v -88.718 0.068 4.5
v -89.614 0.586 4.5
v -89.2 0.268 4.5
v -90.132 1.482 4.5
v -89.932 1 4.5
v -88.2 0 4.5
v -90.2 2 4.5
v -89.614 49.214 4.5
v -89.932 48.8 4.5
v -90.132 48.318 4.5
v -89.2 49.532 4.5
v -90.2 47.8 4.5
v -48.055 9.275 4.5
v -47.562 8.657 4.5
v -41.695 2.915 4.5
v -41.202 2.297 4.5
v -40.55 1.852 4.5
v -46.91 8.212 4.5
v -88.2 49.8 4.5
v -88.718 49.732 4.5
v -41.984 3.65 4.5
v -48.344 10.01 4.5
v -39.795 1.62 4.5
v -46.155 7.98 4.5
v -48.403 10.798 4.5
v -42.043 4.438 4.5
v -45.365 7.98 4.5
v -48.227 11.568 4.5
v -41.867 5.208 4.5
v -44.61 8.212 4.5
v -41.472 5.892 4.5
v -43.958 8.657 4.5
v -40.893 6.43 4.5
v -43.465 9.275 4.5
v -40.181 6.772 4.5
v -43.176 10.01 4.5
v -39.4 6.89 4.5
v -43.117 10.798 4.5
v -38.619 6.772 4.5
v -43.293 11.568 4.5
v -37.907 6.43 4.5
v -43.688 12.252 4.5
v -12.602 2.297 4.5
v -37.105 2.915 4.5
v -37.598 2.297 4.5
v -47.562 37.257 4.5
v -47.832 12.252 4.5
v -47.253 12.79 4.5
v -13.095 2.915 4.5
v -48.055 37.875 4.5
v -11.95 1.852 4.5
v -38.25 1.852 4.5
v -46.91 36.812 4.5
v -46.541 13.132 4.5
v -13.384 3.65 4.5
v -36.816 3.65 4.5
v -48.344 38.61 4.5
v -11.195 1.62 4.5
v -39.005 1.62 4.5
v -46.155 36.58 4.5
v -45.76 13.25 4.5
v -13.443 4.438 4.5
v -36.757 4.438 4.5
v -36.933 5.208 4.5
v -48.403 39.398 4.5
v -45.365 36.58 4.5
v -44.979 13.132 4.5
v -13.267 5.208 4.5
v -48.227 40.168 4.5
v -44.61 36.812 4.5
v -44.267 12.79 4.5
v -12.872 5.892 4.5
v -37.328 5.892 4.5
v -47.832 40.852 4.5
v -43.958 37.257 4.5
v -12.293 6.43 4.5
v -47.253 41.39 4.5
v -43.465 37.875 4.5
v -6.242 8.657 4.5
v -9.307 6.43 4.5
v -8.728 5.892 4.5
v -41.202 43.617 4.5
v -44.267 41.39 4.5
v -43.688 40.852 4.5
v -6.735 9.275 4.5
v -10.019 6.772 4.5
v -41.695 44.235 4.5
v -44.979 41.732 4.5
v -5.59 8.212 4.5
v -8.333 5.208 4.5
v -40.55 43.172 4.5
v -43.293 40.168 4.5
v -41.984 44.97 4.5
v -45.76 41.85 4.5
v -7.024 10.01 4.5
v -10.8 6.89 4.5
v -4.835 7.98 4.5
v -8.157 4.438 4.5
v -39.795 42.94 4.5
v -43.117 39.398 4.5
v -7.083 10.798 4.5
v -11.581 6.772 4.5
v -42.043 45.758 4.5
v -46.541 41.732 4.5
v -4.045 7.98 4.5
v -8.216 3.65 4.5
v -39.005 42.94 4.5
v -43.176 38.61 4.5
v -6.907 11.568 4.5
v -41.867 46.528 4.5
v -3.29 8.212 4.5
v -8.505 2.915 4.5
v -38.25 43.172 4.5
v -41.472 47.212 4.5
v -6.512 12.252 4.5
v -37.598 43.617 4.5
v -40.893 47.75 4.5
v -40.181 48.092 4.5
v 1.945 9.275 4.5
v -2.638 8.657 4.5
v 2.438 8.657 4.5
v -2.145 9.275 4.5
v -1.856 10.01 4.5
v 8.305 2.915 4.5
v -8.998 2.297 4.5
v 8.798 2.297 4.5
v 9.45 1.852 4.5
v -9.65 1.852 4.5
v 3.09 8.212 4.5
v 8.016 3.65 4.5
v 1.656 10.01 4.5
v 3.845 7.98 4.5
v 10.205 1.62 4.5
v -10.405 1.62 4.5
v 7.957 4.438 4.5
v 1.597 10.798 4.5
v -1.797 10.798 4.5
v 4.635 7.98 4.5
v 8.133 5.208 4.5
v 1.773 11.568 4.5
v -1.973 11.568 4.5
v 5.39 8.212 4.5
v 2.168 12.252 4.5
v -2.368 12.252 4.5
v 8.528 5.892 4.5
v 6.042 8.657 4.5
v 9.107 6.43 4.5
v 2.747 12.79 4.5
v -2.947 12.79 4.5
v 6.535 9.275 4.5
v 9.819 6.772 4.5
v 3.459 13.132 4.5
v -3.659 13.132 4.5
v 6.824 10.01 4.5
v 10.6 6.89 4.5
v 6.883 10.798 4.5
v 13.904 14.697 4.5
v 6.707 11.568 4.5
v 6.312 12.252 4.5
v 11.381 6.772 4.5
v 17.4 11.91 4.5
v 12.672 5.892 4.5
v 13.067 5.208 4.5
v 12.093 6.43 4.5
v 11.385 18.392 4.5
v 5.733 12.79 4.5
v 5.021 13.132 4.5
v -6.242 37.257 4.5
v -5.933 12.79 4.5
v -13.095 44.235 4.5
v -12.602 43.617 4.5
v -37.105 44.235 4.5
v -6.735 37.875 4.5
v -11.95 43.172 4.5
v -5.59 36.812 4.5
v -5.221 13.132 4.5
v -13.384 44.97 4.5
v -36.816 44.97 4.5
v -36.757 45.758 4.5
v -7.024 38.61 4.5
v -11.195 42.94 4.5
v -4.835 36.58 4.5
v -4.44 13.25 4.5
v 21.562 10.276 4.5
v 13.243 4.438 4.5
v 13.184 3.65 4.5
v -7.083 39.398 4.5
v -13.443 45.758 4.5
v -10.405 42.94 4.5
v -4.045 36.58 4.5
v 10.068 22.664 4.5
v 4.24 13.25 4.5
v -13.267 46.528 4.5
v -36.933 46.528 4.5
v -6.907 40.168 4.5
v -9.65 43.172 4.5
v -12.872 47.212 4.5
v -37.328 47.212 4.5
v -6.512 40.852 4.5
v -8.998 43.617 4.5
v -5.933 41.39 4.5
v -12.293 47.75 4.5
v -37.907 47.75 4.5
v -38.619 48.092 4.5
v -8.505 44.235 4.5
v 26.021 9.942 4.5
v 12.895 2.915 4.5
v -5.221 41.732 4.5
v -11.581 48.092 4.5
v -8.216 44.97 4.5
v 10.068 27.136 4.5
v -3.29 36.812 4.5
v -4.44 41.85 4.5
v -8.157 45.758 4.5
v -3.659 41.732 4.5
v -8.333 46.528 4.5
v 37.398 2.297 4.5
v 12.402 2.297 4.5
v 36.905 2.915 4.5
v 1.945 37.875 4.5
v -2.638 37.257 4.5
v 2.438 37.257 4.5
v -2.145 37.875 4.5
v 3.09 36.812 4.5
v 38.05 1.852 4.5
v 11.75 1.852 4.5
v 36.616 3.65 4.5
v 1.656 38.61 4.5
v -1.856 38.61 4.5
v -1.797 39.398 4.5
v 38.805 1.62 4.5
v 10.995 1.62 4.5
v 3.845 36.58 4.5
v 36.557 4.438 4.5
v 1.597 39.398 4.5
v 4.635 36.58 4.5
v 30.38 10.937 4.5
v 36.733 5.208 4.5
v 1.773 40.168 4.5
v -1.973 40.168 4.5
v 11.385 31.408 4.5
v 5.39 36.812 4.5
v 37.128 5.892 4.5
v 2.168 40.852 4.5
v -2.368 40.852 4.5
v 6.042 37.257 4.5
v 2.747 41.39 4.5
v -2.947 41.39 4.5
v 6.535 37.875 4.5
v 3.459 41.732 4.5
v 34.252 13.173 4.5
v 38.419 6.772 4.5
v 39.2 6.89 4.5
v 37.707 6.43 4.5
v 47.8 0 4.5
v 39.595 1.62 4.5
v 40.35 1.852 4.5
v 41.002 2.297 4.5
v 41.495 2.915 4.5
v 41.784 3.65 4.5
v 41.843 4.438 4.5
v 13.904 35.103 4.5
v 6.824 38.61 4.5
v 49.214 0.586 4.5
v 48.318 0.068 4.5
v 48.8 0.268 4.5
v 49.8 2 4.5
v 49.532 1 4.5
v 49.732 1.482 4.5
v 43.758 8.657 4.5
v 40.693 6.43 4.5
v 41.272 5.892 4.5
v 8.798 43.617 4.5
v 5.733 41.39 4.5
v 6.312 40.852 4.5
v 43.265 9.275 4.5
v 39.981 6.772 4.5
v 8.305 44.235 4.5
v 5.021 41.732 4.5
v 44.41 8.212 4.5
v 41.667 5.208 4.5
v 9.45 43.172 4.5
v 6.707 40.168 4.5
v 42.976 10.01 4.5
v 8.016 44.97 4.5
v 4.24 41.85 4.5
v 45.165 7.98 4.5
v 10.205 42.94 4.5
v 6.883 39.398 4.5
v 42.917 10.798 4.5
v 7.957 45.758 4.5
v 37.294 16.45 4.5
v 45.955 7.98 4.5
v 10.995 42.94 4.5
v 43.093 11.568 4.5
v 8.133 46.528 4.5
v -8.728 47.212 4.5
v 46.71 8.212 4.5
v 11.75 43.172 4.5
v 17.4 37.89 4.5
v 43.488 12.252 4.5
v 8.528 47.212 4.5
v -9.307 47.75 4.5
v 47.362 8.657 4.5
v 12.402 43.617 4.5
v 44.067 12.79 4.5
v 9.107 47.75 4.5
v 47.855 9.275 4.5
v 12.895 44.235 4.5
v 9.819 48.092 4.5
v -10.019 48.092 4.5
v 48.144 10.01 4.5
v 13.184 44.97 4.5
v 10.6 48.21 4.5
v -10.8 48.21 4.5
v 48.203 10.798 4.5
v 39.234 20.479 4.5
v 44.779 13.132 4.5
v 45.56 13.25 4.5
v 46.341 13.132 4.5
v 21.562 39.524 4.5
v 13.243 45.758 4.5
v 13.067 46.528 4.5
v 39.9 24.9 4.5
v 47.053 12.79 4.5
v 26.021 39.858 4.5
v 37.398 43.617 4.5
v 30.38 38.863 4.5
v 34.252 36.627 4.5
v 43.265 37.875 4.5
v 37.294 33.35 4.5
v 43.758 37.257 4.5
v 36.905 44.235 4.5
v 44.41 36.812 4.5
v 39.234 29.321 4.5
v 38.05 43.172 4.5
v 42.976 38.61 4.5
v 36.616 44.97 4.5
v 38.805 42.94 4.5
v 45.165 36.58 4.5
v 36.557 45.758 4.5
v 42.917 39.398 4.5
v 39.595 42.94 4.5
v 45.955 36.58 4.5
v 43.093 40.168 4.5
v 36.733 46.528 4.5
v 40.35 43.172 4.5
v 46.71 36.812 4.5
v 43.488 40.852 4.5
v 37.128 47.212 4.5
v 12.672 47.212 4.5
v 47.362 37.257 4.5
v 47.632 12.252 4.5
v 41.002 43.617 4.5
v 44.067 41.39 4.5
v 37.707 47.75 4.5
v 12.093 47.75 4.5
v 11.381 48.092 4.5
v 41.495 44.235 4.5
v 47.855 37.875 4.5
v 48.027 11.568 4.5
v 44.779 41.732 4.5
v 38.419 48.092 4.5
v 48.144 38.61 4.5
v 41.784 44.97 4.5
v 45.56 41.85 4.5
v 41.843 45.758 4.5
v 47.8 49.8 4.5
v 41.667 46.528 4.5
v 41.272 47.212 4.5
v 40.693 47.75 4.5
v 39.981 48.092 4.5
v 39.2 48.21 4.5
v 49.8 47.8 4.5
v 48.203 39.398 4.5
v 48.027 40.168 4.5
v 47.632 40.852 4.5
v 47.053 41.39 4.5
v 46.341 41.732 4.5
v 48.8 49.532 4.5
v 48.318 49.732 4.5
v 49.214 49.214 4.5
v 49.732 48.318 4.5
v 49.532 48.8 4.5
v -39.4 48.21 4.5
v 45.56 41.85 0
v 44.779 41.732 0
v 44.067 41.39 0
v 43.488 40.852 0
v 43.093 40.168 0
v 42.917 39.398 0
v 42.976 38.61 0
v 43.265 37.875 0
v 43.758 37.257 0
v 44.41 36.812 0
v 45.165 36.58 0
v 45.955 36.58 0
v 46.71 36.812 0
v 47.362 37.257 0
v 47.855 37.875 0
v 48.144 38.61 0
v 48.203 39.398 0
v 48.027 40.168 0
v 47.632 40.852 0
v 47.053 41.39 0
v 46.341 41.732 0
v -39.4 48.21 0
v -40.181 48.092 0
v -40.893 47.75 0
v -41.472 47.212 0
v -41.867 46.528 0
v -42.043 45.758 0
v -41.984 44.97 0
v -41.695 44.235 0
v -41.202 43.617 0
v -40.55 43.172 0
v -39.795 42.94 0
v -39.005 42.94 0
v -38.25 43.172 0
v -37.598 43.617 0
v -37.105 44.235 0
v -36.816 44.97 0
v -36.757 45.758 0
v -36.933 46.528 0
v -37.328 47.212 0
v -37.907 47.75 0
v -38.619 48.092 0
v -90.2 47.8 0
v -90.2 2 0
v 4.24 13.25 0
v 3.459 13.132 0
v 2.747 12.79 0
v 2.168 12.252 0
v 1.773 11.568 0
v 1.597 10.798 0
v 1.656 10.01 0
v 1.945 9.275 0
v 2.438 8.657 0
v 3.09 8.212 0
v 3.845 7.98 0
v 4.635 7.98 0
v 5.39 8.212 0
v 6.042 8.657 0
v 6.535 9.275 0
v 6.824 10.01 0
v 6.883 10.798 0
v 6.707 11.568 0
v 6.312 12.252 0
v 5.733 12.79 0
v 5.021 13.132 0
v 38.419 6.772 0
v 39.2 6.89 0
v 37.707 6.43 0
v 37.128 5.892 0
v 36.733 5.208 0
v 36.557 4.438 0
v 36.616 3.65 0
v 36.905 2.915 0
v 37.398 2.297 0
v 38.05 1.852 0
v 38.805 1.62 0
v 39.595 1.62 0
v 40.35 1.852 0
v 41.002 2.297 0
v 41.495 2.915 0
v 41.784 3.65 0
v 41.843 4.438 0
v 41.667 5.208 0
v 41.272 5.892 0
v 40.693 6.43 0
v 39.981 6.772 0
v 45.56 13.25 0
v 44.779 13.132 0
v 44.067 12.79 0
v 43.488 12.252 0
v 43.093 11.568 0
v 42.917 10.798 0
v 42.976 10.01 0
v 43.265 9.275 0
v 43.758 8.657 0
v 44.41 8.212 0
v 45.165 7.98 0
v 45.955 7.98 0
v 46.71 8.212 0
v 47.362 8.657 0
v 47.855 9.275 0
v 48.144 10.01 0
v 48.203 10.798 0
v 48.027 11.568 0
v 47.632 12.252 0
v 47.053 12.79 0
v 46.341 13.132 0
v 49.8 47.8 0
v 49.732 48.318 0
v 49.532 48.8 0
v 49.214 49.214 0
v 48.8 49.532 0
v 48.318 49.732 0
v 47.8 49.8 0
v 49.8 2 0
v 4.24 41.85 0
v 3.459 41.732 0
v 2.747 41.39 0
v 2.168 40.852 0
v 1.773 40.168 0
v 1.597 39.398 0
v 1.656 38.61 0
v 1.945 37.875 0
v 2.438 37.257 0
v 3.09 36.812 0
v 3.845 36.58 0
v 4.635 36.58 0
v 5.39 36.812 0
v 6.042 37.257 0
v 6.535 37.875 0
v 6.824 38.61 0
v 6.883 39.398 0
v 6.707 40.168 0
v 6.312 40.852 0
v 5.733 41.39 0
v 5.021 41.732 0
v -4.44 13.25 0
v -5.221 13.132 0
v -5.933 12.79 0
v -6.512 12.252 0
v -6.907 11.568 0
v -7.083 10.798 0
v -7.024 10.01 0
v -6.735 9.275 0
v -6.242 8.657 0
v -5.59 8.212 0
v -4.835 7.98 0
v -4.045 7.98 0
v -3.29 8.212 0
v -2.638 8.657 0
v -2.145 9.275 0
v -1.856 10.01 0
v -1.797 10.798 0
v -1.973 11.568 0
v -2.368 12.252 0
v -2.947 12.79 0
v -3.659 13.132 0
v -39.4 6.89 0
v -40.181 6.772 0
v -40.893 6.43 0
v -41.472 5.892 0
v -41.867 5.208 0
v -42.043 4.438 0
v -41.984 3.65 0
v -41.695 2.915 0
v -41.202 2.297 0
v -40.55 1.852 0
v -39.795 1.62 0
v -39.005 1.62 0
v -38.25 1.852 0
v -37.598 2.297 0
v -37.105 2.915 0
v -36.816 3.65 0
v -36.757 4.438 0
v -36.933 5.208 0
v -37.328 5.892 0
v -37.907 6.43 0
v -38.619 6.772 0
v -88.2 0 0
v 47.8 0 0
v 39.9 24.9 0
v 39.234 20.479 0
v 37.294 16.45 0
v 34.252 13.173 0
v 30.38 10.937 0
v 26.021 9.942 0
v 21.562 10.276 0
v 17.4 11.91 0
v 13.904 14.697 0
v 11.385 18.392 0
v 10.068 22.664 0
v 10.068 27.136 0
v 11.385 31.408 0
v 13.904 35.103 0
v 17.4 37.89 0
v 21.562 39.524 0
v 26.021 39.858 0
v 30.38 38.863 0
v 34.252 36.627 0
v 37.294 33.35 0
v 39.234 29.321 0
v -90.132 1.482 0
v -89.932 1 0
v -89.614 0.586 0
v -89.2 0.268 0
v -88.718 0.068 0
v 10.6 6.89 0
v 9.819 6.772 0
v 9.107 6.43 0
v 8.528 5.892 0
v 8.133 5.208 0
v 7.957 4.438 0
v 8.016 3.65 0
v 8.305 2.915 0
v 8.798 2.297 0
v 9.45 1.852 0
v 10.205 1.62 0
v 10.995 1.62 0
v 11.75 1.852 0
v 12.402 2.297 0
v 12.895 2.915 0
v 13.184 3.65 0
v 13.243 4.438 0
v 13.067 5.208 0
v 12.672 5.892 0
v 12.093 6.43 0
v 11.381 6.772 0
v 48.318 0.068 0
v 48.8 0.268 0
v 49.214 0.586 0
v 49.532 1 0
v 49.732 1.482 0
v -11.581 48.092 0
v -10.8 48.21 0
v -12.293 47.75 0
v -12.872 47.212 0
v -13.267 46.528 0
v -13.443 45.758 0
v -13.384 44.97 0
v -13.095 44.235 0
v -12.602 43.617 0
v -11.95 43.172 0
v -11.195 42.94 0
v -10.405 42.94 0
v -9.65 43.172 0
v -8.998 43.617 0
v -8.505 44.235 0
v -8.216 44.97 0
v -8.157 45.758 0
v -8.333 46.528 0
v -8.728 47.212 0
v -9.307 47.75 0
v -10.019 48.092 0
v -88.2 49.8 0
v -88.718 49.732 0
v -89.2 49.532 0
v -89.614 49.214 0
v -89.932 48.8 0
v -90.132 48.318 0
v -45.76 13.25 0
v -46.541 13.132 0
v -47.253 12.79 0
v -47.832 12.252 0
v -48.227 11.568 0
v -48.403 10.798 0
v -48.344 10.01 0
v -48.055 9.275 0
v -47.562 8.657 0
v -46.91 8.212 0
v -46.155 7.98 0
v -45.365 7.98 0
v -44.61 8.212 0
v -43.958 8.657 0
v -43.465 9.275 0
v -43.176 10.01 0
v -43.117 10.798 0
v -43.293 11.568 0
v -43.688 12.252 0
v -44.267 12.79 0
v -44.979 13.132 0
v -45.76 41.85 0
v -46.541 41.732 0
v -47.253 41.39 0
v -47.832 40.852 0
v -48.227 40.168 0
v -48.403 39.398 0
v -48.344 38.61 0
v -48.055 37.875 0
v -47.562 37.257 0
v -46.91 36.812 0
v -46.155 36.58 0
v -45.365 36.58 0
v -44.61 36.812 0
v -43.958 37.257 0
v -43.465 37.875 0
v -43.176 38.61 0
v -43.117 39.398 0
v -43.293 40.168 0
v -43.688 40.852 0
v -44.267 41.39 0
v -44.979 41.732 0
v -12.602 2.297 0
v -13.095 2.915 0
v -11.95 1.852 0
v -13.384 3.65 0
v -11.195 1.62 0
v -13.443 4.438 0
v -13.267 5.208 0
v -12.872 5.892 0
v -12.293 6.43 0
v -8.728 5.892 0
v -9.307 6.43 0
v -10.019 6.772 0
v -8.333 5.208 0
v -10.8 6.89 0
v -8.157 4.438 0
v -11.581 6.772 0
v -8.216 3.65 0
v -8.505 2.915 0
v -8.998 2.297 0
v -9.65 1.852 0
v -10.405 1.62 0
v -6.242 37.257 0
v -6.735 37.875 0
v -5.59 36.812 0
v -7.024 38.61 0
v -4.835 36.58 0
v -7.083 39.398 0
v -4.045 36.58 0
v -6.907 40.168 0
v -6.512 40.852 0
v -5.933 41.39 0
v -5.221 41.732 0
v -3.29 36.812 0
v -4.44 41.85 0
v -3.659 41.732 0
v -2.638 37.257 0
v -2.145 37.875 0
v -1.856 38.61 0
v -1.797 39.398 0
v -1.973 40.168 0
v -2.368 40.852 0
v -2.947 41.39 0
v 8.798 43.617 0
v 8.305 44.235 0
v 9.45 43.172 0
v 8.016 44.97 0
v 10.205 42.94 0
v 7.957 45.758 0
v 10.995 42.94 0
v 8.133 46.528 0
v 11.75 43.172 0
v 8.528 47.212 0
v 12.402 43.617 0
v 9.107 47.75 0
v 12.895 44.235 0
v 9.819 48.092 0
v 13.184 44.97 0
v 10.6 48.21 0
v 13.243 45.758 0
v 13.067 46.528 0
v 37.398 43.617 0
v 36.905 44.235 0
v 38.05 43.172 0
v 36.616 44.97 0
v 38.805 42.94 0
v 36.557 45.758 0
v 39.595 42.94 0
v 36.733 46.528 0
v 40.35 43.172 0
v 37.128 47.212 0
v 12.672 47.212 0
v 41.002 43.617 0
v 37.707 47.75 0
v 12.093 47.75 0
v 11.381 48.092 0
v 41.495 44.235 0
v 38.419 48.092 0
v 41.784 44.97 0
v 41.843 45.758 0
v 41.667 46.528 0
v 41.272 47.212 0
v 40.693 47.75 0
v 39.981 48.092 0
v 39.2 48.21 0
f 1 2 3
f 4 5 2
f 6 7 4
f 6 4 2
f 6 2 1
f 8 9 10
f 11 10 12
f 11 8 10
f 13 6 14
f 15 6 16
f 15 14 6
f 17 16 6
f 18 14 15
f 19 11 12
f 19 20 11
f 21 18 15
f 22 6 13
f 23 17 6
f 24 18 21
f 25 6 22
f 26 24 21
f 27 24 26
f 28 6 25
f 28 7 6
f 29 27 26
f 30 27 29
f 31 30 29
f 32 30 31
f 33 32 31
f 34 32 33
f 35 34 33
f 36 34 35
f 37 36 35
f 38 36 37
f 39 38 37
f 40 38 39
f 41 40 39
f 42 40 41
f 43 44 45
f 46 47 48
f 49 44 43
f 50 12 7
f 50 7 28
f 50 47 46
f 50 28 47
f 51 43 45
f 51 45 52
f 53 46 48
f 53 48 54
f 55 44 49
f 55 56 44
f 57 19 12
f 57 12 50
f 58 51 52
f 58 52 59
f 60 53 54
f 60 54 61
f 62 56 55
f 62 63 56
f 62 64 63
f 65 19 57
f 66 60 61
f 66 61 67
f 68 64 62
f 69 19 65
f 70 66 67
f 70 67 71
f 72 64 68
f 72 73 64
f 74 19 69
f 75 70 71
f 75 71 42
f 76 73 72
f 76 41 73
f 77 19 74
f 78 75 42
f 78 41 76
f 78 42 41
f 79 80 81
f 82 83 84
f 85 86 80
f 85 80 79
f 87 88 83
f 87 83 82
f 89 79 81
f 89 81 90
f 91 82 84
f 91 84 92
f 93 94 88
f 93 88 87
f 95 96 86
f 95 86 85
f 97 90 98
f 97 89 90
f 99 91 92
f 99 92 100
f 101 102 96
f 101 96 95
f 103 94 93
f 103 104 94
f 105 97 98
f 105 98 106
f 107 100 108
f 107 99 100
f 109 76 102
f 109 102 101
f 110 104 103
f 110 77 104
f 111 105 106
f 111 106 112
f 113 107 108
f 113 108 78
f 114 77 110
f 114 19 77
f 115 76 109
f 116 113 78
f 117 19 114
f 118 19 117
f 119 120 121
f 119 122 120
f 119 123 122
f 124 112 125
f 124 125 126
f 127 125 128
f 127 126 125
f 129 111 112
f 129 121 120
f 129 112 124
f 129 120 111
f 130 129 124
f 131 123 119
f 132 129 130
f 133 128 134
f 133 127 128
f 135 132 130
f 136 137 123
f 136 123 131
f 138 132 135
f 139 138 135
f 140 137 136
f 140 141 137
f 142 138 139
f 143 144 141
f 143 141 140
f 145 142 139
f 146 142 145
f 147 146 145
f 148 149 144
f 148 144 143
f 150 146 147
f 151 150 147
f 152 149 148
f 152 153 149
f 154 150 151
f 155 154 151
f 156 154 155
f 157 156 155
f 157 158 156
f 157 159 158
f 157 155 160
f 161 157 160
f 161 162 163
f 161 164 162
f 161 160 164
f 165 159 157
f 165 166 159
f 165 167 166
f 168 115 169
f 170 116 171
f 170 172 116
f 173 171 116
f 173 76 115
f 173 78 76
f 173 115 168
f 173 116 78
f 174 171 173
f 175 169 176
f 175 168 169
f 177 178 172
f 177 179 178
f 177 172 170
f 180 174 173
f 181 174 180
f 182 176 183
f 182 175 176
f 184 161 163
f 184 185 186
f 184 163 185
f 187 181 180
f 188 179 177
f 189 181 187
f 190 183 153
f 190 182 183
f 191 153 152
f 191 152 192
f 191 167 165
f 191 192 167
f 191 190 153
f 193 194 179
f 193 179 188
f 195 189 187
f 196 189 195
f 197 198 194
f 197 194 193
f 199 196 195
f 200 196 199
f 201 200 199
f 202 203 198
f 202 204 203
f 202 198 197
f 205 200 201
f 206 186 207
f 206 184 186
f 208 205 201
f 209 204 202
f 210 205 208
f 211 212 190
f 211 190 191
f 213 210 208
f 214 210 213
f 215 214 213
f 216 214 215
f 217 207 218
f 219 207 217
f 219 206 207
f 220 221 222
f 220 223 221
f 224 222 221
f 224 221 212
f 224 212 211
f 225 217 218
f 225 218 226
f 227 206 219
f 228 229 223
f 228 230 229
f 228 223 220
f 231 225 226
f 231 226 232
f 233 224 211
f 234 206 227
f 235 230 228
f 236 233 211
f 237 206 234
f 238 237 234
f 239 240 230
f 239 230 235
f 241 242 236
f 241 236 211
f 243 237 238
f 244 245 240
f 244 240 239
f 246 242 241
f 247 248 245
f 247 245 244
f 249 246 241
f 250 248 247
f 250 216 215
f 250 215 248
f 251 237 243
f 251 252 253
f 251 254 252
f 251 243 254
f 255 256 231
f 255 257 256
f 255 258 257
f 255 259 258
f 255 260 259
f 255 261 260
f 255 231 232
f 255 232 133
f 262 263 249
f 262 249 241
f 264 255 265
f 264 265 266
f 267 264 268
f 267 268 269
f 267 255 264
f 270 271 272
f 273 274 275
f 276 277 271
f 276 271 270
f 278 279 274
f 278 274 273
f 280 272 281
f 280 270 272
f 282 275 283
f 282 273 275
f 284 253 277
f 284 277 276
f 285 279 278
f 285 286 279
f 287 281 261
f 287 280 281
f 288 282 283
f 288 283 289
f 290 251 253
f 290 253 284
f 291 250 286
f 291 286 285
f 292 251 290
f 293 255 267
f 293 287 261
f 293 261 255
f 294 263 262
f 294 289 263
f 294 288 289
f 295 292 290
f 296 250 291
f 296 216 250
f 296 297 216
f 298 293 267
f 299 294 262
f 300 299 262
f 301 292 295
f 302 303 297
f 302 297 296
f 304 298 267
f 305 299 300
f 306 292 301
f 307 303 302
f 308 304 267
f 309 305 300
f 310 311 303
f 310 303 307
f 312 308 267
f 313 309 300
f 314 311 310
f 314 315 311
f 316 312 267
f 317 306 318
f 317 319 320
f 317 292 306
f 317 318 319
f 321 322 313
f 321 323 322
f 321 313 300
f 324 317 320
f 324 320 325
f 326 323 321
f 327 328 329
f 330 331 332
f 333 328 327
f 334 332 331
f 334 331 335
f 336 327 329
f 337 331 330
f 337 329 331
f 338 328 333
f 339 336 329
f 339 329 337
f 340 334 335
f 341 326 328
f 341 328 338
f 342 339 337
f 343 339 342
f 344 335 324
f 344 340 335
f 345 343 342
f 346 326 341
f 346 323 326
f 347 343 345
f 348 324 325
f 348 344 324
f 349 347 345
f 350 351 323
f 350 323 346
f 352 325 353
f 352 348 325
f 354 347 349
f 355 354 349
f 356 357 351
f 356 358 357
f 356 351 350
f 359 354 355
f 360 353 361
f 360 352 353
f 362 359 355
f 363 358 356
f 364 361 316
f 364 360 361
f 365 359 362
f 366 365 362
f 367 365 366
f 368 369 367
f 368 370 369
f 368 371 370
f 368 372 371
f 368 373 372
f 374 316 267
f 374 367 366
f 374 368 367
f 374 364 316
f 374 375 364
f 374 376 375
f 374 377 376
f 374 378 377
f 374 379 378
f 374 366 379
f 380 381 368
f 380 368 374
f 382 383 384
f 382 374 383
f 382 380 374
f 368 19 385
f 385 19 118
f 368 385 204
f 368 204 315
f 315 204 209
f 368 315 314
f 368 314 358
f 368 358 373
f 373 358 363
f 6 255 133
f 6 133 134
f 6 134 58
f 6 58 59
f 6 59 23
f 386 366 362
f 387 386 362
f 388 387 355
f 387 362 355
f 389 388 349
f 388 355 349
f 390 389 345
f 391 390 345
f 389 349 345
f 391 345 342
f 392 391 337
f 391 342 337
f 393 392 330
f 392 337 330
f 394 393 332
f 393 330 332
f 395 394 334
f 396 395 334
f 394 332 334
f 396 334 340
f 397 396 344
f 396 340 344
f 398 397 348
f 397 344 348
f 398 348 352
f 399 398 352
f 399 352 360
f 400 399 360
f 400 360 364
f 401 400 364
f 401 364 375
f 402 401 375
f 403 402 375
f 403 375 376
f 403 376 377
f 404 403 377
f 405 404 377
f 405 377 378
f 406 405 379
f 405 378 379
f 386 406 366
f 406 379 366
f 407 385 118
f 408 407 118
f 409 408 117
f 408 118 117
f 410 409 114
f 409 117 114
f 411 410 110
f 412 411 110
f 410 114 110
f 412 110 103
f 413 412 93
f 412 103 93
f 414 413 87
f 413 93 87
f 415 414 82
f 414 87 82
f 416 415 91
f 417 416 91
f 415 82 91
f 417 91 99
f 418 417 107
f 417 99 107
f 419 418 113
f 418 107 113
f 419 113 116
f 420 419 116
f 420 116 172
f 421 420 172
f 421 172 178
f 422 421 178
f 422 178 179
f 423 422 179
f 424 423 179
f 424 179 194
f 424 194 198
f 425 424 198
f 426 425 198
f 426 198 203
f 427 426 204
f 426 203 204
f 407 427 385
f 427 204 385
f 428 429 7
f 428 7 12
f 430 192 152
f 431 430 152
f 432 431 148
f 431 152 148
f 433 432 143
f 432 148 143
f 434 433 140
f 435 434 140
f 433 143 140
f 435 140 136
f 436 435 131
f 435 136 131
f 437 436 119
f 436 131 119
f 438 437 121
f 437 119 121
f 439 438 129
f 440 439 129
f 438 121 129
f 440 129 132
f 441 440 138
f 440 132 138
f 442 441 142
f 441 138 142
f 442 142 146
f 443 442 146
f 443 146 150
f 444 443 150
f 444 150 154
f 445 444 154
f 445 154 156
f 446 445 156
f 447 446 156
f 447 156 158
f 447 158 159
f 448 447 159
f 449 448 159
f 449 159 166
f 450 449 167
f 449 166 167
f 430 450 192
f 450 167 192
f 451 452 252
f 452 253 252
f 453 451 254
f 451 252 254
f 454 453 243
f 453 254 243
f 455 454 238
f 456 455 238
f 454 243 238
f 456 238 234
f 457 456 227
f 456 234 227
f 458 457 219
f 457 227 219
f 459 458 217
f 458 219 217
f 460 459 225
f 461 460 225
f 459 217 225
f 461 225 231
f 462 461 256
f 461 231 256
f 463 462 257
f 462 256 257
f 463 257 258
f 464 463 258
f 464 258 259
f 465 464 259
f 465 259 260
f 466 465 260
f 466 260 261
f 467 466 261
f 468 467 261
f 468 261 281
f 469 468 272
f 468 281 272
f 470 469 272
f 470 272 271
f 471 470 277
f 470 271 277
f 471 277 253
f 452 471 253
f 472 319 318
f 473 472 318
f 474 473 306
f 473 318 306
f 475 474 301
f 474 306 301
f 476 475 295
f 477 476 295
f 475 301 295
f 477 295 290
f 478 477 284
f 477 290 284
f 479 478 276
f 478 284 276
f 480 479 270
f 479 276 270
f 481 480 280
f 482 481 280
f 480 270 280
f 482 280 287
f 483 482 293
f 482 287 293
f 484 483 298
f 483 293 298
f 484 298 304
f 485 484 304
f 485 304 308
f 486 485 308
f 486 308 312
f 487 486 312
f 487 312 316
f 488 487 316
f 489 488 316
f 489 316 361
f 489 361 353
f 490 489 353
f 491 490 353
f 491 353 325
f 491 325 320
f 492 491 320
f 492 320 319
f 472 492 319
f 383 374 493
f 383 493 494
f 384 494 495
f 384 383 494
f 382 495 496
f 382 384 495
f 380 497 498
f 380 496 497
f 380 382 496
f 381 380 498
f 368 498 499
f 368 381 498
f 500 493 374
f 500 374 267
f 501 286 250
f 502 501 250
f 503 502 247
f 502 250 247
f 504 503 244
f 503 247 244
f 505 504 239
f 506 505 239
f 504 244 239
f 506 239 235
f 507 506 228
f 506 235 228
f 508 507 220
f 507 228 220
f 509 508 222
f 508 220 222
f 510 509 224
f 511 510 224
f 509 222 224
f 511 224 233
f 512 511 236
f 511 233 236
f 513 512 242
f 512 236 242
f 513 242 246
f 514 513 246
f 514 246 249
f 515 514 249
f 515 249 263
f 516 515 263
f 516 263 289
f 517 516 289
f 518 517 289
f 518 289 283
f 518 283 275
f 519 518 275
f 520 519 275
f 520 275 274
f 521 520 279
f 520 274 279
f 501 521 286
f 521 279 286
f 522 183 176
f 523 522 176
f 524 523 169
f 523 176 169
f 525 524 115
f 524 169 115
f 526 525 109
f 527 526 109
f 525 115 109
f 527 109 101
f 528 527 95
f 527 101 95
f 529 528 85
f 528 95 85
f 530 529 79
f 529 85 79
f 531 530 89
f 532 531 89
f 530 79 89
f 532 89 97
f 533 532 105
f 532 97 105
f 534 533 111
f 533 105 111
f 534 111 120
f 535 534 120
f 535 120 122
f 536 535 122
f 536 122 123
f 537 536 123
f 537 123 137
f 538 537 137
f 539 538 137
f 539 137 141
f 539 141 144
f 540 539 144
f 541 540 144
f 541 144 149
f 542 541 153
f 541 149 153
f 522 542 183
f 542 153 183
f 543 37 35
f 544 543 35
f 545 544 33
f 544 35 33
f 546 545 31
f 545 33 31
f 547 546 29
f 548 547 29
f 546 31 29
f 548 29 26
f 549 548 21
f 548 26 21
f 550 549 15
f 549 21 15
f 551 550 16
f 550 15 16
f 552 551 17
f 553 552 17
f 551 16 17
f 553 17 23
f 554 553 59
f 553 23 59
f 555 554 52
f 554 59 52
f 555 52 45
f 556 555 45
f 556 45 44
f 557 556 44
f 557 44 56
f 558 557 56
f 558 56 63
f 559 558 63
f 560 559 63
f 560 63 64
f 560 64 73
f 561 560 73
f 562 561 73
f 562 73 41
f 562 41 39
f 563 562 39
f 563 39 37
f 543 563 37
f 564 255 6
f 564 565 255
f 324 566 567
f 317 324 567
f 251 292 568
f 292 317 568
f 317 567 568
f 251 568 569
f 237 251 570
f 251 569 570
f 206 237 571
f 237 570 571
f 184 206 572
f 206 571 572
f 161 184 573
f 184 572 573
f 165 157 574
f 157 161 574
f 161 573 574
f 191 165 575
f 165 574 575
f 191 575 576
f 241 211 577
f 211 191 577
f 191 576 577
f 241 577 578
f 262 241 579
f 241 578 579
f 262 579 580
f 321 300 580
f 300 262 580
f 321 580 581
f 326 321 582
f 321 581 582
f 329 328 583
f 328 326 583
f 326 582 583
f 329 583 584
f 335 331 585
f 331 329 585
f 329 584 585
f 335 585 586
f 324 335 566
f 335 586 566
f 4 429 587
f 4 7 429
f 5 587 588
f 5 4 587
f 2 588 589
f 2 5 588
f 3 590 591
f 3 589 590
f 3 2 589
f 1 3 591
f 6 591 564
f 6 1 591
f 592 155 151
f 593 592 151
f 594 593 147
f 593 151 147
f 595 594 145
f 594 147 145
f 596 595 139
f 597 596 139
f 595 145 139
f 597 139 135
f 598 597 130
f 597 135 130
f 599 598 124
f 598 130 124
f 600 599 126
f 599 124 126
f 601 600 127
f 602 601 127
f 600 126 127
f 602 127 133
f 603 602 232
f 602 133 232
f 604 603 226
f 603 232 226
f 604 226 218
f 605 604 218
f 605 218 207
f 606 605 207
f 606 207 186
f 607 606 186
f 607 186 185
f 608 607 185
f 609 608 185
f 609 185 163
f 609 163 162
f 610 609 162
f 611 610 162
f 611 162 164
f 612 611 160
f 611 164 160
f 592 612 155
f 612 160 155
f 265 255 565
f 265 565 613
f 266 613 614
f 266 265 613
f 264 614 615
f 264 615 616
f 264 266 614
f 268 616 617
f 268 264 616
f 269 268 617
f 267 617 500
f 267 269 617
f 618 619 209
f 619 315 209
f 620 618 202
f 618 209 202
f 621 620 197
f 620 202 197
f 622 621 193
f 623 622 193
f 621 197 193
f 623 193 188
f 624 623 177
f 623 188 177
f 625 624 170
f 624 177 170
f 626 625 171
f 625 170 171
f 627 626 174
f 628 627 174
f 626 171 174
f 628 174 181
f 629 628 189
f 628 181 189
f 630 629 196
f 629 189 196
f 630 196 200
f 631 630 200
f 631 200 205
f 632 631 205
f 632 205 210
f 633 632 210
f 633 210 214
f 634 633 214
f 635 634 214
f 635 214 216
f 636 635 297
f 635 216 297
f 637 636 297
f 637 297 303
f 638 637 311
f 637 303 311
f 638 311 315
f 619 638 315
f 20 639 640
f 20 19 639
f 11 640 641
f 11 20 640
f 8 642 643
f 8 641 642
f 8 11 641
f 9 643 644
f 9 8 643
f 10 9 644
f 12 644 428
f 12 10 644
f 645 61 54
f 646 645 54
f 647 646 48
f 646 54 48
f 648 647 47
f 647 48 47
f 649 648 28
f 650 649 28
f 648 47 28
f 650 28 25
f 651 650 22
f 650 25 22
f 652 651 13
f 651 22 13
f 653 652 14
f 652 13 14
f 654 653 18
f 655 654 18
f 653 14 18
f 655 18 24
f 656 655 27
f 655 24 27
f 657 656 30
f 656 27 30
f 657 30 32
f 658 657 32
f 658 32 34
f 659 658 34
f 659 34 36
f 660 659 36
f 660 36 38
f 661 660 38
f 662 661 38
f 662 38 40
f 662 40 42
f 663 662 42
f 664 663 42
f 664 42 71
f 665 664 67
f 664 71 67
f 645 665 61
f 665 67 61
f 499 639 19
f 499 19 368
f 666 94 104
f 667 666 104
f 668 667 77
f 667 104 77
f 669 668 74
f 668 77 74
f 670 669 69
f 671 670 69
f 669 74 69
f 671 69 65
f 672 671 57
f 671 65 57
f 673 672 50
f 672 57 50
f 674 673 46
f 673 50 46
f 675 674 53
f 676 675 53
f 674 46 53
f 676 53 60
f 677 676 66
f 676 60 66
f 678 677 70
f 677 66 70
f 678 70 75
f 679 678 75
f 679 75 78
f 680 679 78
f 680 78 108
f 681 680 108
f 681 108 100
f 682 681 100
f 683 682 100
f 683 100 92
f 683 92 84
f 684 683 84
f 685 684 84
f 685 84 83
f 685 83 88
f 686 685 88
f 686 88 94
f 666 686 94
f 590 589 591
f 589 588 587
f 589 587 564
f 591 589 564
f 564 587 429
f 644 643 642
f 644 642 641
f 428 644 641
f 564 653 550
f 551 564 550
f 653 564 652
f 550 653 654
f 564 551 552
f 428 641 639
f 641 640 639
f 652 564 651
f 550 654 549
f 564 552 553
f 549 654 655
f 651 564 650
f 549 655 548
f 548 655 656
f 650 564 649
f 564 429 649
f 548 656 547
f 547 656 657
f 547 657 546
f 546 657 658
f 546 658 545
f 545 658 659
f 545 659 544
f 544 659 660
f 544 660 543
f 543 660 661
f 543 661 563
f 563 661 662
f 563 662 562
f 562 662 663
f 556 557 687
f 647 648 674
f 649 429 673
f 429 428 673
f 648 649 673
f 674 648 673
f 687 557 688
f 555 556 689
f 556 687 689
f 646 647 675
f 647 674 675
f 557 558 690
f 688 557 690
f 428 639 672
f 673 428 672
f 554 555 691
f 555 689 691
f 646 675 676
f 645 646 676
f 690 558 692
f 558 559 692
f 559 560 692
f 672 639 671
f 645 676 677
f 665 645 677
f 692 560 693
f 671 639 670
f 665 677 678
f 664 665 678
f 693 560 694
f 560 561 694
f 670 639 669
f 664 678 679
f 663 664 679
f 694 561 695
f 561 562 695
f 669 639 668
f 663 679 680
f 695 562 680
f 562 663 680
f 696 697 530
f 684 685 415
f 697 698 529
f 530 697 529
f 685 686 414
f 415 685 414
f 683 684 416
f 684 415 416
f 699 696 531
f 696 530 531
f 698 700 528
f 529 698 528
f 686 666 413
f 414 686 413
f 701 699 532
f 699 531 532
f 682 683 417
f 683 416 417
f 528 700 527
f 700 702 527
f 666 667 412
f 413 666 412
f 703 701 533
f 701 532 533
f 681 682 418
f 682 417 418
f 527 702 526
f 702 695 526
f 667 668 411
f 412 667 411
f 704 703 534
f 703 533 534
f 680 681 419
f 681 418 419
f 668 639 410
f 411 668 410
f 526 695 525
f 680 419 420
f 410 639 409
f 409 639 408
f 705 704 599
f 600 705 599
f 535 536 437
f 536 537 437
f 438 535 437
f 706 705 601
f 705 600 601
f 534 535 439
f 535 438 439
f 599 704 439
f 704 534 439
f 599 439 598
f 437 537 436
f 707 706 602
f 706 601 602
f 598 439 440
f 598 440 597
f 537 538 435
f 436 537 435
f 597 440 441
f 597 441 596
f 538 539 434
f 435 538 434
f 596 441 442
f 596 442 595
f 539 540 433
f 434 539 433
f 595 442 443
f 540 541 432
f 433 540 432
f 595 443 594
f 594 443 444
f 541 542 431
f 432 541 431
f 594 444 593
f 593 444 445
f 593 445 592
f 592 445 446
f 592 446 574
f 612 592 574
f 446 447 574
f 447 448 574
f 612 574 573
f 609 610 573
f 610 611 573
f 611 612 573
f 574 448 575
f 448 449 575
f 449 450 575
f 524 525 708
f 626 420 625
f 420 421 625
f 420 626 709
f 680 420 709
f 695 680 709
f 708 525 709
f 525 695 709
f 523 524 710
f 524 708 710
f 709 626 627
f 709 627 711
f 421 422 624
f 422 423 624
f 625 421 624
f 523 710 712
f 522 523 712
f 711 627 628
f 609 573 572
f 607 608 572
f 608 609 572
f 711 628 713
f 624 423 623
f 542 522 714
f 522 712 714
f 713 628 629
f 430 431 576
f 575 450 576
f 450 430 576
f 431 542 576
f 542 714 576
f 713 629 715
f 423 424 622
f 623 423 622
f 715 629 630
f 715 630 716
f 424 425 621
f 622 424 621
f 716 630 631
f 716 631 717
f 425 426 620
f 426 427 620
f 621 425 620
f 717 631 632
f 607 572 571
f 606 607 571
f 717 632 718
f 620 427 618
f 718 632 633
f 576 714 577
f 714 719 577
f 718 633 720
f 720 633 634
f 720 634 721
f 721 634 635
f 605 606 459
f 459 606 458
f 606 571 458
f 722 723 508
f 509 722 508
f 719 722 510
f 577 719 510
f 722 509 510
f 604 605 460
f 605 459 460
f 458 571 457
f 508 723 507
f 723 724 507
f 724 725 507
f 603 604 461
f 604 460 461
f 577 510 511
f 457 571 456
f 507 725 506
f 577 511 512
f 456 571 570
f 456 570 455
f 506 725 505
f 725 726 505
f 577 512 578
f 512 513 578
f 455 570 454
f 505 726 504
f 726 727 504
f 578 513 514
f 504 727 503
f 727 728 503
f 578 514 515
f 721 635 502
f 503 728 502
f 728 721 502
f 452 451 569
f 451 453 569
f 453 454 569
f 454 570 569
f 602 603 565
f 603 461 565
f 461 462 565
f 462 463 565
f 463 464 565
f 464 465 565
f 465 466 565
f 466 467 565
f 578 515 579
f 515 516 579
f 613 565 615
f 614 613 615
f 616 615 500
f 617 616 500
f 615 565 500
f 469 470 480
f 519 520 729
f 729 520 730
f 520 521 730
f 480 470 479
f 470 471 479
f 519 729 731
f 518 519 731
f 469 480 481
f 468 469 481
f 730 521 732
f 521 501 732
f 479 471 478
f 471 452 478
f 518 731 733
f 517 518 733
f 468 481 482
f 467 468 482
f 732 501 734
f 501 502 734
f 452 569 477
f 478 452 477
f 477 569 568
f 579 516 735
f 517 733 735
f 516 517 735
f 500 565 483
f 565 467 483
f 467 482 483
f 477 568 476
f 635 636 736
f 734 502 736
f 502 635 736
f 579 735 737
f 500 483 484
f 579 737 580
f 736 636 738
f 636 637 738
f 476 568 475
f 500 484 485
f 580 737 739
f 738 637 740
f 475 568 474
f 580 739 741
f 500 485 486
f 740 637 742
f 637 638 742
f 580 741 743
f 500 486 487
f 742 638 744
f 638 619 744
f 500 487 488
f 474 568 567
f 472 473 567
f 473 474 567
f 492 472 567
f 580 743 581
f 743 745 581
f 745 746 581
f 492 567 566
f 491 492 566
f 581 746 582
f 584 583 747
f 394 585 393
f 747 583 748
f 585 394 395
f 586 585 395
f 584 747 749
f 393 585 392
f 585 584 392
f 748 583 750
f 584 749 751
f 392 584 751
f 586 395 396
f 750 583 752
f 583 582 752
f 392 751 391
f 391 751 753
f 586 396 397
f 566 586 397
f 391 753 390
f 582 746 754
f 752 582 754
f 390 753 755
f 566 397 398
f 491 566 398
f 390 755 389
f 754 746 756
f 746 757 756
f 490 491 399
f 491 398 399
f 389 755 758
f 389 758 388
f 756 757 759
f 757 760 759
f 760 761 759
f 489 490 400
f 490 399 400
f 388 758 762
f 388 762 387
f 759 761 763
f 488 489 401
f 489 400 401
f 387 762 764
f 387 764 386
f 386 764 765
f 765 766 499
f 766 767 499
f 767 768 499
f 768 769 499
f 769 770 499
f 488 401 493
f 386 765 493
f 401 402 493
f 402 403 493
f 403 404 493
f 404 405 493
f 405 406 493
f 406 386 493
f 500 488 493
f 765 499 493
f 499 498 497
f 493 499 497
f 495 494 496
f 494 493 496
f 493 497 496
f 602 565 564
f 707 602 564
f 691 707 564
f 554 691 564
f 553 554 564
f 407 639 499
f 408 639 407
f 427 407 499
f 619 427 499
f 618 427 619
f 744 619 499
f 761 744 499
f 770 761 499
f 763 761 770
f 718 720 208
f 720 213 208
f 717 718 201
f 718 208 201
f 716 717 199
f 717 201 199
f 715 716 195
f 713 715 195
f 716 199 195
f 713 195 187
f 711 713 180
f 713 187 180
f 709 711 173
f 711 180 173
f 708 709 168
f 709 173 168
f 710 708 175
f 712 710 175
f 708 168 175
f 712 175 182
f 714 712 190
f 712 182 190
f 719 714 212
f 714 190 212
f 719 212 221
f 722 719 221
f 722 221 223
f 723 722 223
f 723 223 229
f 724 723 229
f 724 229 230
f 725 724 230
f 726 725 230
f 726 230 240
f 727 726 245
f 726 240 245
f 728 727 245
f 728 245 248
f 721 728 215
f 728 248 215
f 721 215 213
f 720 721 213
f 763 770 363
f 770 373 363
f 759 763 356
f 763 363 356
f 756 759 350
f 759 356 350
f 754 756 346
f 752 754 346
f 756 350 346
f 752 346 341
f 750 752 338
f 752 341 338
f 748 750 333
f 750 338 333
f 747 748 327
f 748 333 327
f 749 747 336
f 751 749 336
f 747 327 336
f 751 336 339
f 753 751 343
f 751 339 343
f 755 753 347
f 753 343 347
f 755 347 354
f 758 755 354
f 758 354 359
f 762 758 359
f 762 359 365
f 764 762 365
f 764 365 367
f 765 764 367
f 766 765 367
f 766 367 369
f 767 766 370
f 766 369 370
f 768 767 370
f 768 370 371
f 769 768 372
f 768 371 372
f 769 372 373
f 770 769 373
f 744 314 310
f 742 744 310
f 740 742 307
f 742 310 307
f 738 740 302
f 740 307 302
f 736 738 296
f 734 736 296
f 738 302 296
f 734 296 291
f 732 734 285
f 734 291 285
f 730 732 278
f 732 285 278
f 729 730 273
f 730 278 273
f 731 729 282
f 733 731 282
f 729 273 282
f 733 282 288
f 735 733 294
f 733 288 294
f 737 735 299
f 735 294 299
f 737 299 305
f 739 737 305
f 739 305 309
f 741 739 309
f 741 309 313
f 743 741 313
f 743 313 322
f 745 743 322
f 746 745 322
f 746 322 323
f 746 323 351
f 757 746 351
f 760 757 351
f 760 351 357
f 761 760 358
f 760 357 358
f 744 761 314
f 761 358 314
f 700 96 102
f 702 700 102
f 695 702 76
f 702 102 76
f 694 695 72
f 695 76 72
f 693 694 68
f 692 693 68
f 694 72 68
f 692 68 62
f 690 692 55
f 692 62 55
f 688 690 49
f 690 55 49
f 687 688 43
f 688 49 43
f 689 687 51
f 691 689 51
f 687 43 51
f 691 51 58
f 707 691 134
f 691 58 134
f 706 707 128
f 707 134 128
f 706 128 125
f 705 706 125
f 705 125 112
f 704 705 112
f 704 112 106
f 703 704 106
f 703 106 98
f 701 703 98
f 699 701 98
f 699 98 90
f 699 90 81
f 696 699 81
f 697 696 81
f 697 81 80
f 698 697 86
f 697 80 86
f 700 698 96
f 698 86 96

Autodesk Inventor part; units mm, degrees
ref_plane "YZ Plane" through (0, 0, 0) normal (1, 0, 0) x (0, 1, 0)
ref_plane "XZ Plane" through (0, 0, 0) normal (0, 1, 0) x (-1, 0, 0)
ref_plane "XY Plane" through (0, 0, 0) normal (0, 0, 1) x (1, 0, 0)
sketch "Sketch1" plane through (0, 0, 0) normal (0, 0, 1) x (1, 0, 0)
  circle A0 centre (44.9, 4.9) radius 1.45 construction
  circle A1 centre (4.9, 4.9) radius 1.45 construction
  line L0 (2, 2) -> (2, 41.8) construction
  line L1 (47.8, 2) -> (2, 2) construction
  line L2 (47.8, 41.8) -> (47.8, 2) construction
  line L3 (41.8, 41.8) -> (47.8, 41.8) construction
  line L4 (41.8, 8) -> (41.8, 41.8) construction
  line L5 (8, 8) -> (41.8, 8) construction
  line L6 (8, 8) -> (8, 41.8) construction
  line L7 (2, 41.8) -> (8, 41.8) construction
  circle A2 centre (44.9, 44.9) radius 1.4 construction
  circle A3 centre (4.9, 44.9) radius 1.4 construction
  line L8 (2, 47.8) -> (47.8, 47.8) construction
  line L9 (2, 41.8) -> (2, 47.8) construction
  line L10 (47.8, 41.8) -> (2, 41.8) construction
  line L11 (47.8, 41.8) -> (47.8, 47.8) construction
  circle A4 centre (25.6838, 25.4066) radius 13.6 construction
  line L12 (44.1319, 49.8) -> (5.6681, 49.8) construction
  arc A5 (49.8, 47.8) -> (47.8, 49.8) centre (47.8, 47.8) ccw construction
  line L13 (49.8, 41.8) -> (49.8, 47.8) construction
  arc A6 (2, 49.8) -> (0, 47.8) centre (2, 47.8) ccw construction
  arc A7 (0, 2) -> (2, 0) centre (2, 2) ccw construction
  arc A8 (47.8, 0) -> (49.8, 2) centre (47.8, 2) ccw construction
  line L14 (49.8, 0) -> (-90.2, 0)
  line L15 (-90.2, 0) -> (-90.2, 49.8)
  line L16 (-90.2, 49.8) -> (49.8, 49.8)
  line L17 (49.8, 49.8) -> (49.8, 0)
  line L18 (8, 3.7577) -> (41.8, 3.7577) construction
  line L19 (41.8, 0) -> (41.8, 3.7577) construction
  line L20 (8, 0) -> (41.8, 0) construction
  line L21 (8, 0) -> (8, 3.7577) construction
  line L22 (46.1838, 8) -> (46.1838, 41.8) construction
  line L23 (49.8, 41.8) -> (46.1838, 41.8) construction
  line L24 (49.8, 8) -> (49.8, 41.8) construction
  line L25 (46.1838, 8) -> (49.8, 8) construction
  line L26 (3.6162, 41.8) -> (3.6162, 8) construction
  line L27 (0, 8) -> (3.6162, 8) construction
  line L28 (0, 8) -> (0, 41.8) construction
  line L29 (3.6162, 41.8) -> (0, 41.8) construction
  circle A9 centre (24.9, 24.9) radius 15
  arc A10 (42.3945, 24.4616) -> (22.4616, 42.2293) centre (24.9, 24.9) ccw construction
  arc A11 (22.5619, 16.1033) -> (42.3945, 24.4616) centre (29.0002, 28.5351) ccw construction
  line L30 (22.5619, 16.1033) -> (22.3031, 15.1374) construction
  arc A12 (22.3031, 15.1374) -> (41.5232, 19.4302) centre (29.3361, 28.8218) ccw construction
  arc A13 (15.3425, 10.2404) -> (41.5232, 19.4302) centre (24.9, 24.9) ccw construction
  arc A14 (18.2047, 31.6263) -> (15.3425, 10.2404) centre (25.6173, 19.7498) ccw construction
  line L31 (18.2047, 31.6263) -> (17.4976, 32.3335) construction
  arc A15 (17.4976, 32.3335) -> (11.1478, 14.0775) centre (25.6302, 19.2725) ccw construction
  arc A16 (16.2809, 40.1303) -> (11.1478, 14.0775) centre (24.9, 24.9) ccw construction
  arc A17 (34.0602, 27.4798) -> (16.2809, 40.1303) centre (20.0844, 26.6568) ccw construction
  line L32 (34.0602, 27.4798) -> (35.0261, 27.7386) construction
  arc A18 (35.0261, 27.7386) -> (22.4616, 42.2293) centre (19.6533, 27.1018) ccw construction
  line L33 (3.6577, 41.7) -> (8.1, 46.1423) construction
  line L34 (0, 41.7) -> (3.6577, 41.7) construction
  line L35 (0, 8.1) -> (0, 41.7) construction
  line L36 (3.6577, 8.1) -> (0, 8.1) construction
  line L37 (8.1, 3.6577) -> (3.6577, 8.1) construction
  line L38 (8.1, 0) -> (8.1, 3.6577) construction
  line L39 (41.7, 0) -> (8.1, 0) construction
  line L40 (41.7, 3.6577) -> (41.7, 0) construction
  line L41 (46.1423, 8.1) -> (41.7, 3.6577) construction
  line L42 (49.8, 8.1) -> (46.1423, 8.1) construction
  line L43 (49.8, 41.7) -> (49.8, 8.1) construction
  line L44 (46.1423, 41.7) -> (49.8, 41.7) construction
  line L45 (41.7, 46.1423) -> (46.1423, 41.7) construction
  line L46 (41.7, 49.8) -> (41.7, 46.1423) construction
  line L47 (8.1, 49.8) -> (41.7, 49.8) construction
  line L48 (8.1, 46.1423) -> (8.1, 49.8) construction
  circle A19 centre (24.9, 24.9) radius 16.9 construction
  point P0 (0, 0)
  dimension "d0" = 30
  dimension "d4" = 140
extrude "Extrusion1" add sketch "Sketch1" along normal blind 4.5
fillet "Fillet1" radius 2 4 edges at (49.8, 49.8, 2.25) (-90.2, 49.8, 2.25) (49.8, 0, 2.25) (-90.2, 0, 2.25)
sketch "Sketch2" plane through (0, 0, 0) normal (0, 0, -1) x (-1, 0, 0)
  line L0 (-41.8, 8) -> (-41.8, 41.8) construction
  line L1 (-8, 8) -> (-41.8, 8) construction
  line L2 (-8, 8) -> (-8, 41.8) construction
  line L3 (-47.8, 41.8) -> (-2, 41.8) construction
  circle A0 centre (-24.9, 24.9) radius 15 construction
  arc A1 (88.2, 0) -> (90.2, 2) centre (88.2, 2) ccw construction
  line L4 (90.2, 2) -> (90.2, 47.8) construction
  arc A2 (90.2, 47.8) -> (88.2, 49.8) centre (88.2, 47.8) ccw construction
  line L5 (88.2, 49.8) -> (-47.8, 49.8) construction
  arc A3 (-47.8, 49.8) -> (-49.8, 47.8) centre (-47.8, 47.8) ccw construction
  line L6 (-49.8, 47.8) -> (-49.8, 2) construction
  arc A4 (-49.8, 2) -> (-47.8, 0) centre (-47.8, 2) ccw construction
  line L7 (-47.8, 0) -> (88.2, 0) construction
  line L8 (-41.5, 41.5) -> (-8.3, 41.5)
  line L9 (-8.3, 41.5) -> (-8.3, 8.3)
  line L10 (-8.3, 8.3) -> (-41.5, 8.3)
  line L11 (-41.5, 8.3) -> (-41.5, 41.5)
  line L12 (-9.3, 40.5) -> (-40.5, 40.5)
  line L13 (-40.5, 40.5) -> (-40.5, 9.3)
  line L14 (-40.5, 9.3) -> (-9.3, 9.3)
  line L15 (-9.3, 9.3) -> (-9.3, 40.5)
  point P0 (0, 0)
  dimension "d6" = 0.3
  dimension "d7" = 0.3
  dimension "d8" = 0.3
  dimension "d9" = 0.3
  dimension "d10" = 1
extrude "Extrusion2" [suppressed]
sketch "Sketch4" plane through (0, 0, 0) normal (0, 0, -1) x (-1, 0, 0)
  circle A0 centre (-39.2, 45.56) radius 2.475 construction
  circle A1 centre (-10.6, 45.56) radius 2.475 construction
  circle A2 centre (-45.56, 39.2) radius 2.475 construction
  circle A3 centre (-45.56, 10.6) radius 2.475 construction
  circle A4 centre (-39.2, 4.24) radius 2.475 construction
  circle A5 centre (-4.24, 10.6) radius 2.475 construction
  circle A6 centre (-10.6, 4.24) radius 2.475 construction
  circle A7 centre (-4.24, 39.2) radius 2.475 construction
  circle A8 centre (4.44, 10.6) radius 2.475 construction
  circle A9 centre (10.8, 4.24) radius 2.475 construction
  circle A10 centre (39.4, 4.24) radius 2.475 construction
  circle A11 centre (4.44, 39.2) radius 2.475 construction
  circle A12 centre (10.8, 45.56) radius 2.475 construction
  circle A13 centre (39.4, 45.56) radius 2.475 construction
  circle A14 centre (45.76, 10.6) radius 2.475 construction
  circle A15 centre (45.76, 39.2) radius 2.475 construction
  point P0 (0, 0)
hole "Hole1" at (39.2, 45.56, 0) at (45.56, 39.2, 0) at (45.56, 10.6, 0) at (39.2, 4.24, 0) at (10.6, 45.56, 0) at (4.24, 39.2, 0) at (10.6, 4.24, 0) at (4.24, 10.6, 0) at (-4.44, 39.2, 0) at (-4.44, 10.6, 0) at (-10.8, 45.56, 0) at (-10.8, 4.24, 0) at (-39.4, 45.56, 0) at (-39.4, 4.24, 0) at (-45.76, 10.6, 0) at (-45.76, 39.2, 0) direction (0, 0, 1) diameter 5.3 end through all
equation "\"d7\" = d6"
equation "\"d8\" = d6"
equation "\"d9\" = d6"
properties part number "30_Smartphone_Holder_v3"
